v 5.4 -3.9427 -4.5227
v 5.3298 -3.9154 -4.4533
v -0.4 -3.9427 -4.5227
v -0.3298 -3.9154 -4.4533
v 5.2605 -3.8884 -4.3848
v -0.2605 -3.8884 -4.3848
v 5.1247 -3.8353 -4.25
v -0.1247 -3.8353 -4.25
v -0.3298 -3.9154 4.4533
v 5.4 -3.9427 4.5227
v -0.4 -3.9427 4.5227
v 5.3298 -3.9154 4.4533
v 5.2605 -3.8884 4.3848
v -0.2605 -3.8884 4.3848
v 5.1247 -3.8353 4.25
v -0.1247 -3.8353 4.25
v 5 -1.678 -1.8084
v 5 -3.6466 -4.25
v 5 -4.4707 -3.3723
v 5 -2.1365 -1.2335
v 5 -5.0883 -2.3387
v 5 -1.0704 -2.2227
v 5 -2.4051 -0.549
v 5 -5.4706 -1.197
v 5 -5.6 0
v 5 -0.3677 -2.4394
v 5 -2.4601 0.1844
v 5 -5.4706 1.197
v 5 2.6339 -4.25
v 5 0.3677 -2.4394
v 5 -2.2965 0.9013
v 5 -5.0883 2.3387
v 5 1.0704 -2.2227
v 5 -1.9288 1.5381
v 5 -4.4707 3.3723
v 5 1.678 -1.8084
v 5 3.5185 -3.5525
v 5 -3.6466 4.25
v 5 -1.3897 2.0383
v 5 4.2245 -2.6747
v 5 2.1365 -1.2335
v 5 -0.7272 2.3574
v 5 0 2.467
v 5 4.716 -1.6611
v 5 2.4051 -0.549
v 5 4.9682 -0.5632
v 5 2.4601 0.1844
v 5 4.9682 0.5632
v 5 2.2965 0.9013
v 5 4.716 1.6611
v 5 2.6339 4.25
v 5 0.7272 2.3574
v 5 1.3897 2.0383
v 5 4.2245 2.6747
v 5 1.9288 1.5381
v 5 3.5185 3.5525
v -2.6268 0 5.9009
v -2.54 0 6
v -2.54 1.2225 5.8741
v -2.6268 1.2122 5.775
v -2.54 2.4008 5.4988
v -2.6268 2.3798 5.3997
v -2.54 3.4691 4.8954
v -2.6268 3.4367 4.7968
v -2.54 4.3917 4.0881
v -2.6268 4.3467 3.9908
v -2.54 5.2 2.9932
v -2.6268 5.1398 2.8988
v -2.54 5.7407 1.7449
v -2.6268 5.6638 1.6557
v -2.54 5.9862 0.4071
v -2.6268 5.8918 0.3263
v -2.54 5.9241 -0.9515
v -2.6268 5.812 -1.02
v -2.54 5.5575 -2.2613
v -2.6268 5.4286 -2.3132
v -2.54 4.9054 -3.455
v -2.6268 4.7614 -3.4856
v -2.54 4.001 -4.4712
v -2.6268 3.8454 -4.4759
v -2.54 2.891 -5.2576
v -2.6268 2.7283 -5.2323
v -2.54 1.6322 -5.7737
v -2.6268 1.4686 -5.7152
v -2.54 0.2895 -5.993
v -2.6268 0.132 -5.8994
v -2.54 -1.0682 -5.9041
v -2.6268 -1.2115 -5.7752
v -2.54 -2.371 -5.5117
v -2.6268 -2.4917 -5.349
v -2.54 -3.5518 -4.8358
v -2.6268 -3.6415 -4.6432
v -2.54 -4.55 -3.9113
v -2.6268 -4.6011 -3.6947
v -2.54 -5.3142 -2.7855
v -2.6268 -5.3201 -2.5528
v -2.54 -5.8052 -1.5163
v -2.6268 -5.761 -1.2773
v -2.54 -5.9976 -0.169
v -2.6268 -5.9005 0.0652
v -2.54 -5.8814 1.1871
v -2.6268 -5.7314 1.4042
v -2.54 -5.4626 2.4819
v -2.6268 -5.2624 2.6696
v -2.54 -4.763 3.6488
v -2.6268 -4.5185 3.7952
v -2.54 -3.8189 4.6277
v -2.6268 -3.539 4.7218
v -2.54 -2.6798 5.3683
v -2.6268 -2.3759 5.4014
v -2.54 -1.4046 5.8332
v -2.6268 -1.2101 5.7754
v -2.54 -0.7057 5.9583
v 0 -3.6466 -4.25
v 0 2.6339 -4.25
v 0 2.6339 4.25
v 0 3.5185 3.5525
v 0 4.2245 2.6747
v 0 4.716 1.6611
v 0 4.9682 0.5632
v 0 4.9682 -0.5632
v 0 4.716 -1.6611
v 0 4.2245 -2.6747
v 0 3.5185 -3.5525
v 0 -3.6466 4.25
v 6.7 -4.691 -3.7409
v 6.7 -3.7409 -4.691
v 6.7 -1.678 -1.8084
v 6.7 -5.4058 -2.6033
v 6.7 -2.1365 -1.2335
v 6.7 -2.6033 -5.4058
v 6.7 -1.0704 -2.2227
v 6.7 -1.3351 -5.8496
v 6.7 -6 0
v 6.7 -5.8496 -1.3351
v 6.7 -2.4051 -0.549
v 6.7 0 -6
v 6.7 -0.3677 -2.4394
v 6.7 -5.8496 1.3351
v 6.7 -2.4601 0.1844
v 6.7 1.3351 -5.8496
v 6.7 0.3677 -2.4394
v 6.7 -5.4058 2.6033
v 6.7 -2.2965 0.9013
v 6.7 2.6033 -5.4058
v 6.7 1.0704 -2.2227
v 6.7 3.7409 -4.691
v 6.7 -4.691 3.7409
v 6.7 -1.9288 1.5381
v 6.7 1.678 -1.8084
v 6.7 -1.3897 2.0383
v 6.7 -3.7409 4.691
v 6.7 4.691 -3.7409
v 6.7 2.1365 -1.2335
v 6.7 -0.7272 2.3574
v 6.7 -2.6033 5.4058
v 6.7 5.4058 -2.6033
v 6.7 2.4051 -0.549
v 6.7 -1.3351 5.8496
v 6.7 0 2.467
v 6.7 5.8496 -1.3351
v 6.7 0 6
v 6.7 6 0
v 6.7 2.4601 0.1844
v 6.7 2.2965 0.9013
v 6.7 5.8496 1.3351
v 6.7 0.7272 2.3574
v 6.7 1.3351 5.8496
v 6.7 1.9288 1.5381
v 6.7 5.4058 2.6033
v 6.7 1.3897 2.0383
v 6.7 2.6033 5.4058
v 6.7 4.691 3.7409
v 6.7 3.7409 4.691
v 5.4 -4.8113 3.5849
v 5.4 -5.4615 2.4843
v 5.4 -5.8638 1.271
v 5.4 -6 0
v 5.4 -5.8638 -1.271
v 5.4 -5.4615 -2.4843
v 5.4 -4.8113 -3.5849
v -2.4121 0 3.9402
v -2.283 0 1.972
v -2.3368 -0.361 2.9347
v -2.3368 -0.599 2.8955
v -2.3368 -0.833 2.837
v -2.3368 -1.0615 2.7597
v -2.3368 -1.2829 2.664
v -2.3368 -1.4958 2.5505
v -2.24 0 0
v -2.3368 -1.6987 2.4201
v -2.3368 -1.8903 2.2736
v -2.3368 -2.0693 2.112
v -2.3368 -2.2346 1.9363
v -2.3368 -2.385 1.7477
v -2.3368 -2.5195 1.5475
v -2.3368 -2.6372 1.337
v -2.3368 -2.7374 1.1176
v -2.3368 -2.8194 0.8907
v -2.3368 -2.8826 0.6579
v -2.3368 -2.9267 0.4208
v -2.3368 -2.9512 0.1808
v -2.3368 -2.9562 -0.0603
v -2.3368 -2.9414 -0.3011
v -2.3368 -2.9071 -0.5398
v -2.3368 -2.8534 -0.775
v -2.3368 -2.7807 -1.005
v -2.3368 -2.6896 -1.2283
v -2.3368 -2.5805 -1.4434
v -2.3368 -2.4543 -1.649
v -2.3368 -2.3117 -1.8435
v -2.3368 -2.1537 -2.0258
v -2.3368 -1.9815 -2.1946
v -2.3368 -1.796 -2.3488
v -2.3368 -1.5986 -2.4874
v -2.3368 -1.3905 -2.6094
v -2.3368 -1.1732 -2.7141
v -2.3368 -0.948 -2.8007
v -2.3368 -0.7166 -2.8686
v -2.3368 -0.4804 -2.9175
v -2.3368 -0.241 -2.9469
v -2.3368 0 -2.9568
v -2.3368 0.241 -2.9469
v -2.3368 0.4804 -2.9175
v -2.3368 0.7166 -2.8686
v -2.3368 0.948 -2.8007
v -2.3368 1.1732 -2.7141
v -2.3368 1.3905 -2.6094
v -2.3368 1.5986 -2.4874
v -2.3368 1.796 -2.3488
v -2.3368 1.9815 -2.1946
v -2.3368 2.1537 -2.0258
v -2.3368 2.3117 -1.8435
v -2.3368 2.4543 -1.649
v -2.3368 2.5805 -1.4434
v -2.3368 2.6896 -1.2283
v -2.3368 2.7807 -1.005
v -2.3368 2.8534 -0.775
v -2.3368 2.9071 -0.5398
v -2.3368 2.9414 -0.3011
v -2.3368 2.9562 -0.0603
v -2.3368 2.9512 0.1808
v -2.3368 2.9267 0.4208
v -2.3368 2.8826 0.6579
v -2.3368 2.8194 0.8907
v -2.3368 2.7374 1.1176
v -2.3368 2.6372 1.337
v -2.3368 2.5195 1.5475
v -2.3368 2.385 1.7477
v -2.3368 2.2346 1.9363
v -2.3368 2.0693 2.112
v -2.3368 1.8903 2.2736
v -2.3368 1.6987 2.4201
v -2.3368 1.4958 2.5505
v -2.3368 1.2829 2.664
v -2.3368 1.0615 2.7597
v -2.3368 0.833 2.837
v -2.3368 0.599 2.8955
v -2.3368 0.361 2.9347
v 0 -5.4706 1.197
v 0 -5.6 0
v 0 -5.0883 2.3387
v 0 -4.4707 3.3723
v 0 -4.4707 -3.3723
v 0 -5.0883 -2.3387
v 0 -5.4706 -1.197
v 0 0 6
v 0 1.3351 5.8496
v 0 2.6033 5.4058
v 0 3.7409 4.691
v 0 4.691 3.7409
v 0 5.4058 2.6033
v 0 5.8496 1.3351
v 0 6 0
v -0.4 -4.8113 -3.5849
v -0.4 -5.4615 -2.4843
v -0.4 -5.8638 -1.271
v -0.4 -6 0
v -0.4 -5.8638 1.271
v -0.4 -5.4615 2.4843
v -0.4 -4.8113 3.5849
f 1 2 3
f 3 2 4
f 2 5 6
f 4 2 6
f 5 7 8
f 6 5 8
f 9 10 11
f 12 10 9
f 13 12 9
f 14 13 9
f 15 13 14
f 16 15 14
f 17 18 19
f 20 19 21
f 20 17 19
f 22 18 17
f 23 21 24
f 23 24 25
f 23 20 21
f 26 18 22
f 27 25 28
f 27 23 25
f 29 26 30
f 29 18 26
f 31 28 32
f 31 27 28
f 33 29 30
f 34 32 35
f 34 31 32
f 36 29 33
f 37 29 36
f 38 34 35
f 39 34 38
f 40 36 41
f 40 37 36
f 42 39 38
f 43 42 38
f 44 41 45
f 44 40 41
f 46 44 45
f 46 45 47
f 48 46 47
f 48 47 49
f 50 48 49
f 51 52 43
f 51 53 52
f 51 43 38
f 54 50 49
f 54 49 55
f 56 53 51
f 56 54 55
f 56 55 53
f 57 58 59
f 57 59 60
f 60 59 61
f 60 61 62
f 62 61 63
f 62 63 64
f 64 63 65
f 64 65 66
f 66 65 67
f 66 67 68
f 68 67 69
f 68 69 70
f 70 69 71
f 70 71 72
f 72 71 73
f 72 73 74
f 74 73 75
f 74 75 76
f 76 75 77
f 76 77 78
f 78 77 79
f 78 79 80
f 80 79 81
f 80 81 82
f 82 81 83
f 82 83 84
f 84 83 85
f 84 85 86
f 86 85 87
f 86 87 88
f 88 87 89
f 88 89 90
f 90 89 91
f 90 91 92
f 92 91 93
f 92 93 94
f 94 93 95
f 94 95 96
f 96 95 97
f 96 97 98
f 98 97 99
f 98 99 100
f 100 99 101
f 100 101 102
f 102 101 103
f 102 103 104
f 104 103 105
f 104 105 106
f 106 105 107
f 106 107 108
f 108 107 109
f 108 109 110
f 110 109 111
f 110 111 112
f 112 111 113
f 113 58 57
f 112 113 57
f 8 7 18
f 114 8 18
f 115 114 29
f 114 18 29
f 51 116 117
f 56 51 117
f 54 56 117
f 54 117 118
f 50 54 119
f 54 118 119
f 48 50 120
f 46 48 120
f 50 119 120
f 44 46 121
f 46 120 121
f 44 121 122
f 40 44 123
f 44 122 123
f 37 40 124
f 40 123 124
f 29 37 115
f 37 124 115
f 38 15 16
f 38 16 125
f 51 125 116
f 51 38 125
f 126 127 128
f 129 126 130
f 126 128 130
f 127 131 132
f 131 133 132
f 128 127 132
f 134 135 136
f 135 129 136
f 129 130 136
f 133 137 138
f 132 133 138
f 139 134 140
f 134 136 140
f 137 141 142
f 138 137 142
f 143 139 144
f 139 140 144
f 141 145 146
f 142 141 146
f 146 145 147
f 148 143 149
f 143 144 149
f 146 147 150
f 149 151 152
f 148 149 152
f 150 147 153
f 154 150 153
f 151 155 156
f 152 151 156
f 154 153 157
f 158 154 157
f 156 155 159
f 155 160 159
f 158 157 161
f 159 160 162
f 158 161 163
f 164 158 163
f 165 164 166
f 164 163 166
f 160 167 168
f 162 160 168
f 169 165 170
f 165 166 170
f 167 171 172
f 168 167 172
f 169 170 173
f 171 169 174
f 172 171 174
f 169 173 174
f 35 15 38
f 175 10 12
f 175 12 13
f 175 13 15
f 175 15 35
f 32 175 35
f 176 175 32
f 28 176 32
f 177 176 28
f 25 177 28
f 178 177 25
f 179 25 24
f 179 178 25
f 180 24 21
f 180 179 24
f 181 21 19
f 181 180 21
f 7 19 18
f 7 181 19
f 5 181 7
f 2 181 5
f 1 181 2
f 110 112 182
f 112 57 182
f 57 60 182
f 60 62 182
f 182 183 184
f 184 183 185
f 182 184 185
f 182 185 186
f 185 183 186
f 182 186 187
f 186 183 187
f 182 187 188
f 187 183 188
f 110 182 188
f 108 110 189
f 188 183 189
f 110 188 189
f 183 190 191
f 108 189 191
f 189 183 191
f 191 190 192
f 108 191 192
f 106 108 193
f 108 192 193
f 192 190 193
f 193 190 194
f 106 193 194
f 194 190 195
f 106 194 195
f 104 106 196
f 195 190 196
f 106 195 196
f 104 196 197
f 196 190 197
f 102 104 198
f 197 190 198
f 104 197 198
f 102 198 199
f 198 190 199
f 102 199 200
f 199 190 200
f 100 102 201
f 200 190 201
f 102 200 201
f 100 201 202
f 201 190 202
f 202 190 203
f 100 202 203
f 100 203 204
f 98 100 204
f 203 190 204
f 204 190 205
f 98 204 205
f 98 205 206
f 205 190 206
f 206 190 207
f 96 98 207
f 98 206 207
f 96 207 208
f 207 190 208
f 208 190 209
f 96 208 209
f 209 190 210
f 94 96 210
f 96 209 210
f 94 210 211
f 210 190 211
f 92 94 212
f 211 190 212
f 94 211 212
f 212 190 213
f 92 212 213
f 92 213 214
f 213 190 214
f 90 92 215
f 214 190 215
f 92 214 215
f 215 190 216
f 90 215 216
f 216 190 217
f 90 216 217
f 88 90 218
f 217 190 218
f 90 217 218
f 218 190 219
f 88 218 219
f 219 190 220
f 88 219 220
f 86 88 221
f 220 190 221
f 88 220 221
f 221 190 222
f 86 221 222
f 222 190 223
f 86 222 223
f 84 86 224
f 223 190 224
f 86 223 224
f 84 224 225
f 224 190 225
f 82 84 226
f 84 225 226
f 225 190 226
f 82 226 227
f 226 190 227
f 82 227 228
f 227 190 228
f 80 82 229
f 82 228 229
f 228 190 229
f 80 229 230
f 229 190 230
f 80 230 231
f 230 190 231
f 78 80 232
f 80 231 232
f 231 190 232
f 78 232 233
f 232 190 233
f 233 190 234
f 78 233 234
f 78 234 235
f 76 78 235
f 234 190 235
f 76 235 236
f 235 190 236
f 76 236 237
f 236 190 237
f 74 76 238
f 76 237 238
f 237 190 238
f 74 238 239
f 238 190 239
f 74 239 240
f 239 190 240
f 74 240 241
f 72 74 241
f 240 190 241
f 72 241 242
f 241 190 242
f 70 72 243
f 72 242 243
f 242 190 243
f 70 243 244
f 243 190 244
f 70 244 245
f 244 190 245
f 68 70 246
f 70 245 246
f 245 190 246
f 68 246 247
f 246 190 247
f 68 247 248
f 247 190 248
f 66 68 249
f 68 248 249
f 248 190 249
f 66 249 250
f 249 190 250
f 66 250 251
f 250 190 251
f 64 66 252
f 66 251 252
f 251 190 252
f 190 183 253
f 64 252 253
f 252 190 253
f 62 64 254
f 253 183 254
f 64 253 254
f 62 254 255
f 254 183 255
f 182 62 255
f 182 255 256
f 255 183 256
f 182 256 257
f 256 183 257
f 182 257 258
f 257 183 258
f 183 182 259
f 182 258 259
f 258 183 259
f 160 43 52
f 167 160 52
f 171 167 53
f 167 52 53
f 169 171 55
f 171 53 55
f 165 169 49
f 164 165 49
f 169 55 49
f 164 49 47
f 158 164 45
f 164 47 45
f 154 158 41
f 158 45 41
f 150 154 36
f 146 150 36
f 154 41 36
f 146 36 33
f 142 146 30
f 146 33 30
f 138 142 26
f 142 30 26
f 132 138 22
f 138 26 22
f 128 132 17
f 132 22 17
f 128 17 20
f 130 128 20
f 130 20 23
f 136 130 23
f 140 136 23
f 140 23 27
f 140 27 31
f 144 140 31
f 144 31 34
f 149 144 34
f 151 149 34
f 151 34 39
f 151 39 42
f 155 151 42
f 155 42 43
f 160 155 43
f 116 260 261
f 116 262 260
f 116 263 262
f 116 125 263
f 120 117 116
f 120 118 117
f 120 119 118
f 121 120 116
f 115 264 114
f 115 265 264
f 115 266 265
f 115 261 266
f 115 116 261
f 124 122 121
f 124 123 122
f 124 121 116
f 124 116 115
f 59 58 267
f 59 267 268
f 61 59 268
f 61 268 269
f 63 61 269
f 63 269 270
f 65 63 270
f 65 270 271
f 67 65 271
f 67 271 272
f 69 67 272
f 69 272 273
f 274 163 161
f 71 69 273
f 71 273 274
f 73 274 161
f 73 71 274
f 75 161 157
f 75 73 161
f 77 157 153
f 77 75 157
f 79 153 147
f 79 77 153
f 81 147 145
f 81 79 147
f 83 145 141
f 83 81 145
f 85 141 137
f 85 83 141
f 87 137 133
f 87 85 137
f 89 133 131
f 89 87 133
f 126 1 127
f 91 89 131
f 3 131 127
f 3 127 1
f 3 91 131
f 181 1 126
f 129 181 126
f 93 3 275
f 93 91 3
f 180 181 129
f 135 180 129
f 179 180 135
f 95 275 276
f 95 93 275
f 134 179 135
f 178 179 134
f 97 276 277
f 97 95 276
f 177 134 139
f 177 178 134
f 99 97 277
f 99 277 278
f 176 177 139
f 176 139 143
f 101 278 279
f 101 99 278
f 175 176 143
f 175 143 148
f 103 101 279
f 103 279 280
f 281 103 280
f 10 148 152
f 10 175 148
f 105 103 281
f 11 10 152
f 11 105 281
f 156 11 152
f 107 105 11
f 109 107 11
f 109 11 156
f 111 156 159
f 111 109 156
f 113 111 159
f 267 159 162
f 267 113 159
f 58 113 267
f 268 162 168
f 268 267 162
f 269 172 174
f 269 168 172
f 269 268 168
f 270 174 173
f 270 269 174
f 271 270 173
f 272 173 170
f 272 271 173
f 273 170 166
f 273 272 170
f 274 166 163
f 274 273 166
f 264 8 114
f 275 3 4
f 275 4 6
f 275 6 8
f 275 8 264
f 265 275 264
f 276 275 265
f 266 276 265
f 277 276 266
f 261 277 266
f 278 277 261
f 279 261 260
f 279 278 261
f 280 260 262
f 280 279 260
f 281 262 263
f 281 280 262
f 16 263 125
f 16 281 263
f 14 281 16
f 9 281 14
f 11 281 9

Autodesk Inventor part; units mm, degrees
ref_plane "YZ Plane" through (0, 0, 0) normal (1, 0, 0) x (0, 1, 0)
ref_plane "XZ Plane" through (0, 0, 0) normal (0, 1, 0) x (-1, 0, 0)
ref_plane "XY Plane" through (0, 0, 0) normal (0, 0, 1) x (1, 0, 0)
sketch "Эскиз1" plane through (0, 0, 0) normal (1, 0, 0) x (0, 1, 0)
  circle A0 centre (0, 0) radius 2.067 construction
  circle A1 centre (0, 0) radius 5
  circle A2 centre (0, 0) radius 6
  circle A3 centre (0, 0) radius 2.467 projected
  point P0 (0, 0)
  dimension "d1" = 10
  dimension "d2" = 12
extrude "Выдавливание1" add sketch "Эскиз1" along normal blind 6.7 contours A2
sketch "Эскиз4" plane through (0, 0, 0) normal (-1, 0, 0) x (0, 0, 1)
  circle A0 centre (0, 0) radius 6 projected
  circle A1 centre (0, 0) radius 5 projected
  point P0 (0, 0)
extrude "Выдавливание2" add sketch "Эскиз4" along normal blind 2.64 contours A0 | A1
ref_plane "РабПлоскость1" through (0, 0, 0) normal (0, 1, 0) x (-1, 0, 0)
sketch "Эскиз5" plane through (0, 0, 0) normal (0, 1, 0) x (-1, 0, 0)
  line L0 (2.64, -6) -> (-6.7, -6) projected
  line L1 (-5, 6) -> (0, 6)
  line L2 (0, 6) -> (0, -6)
  line L3 (0, -6) -> (-5, -6)
  line L4 (-5, -6) -> (-5, 6)
  line L5 (2.64, 6) -> (-6.7, 6) projected
  line L6 (0, 6) -> (0, -6) projected
  point P0 (0, 0)
  dimension "d7" = 5
extrude "Выдавливание3" cut sketch "Эскиз5" against normal through all
sketch "Эскиз6" plane through (5, 0, 5) normal (-1, 0, 0) x (0, 0, 1)
  circle A0 centre (-5, 0) radius 5 projected
  circle A1 centre (-5, 0) radius 2.467 projected
extrude "Выдавливание4" add sketch "Эскиз6" against normal up to surface (1.7 mm away)
sketch "Эскиз7" plane through (5, 0, 5) normal (-1, 0, 0) x (0, 0, 1)
  line L0 (-1, 0) -> (-1, -2.3094) projected
  line L1 (-9, -2.3094) -> (-9, 0) projected
  circle A0 centre (-5, 0) radius 6 projected
  line L2 (-0.75, -4.2353) -> (-0.75, -2.6339)
  line L3 (1, 0) -> (0, 0) projected
  line L4 (-10, 0) -> (-11, 0) projected
  line L5 (-9.25, -2.6339) -> (-9.25, -4.2353)
  line L6 (-0.75, -2.6339) -> (-0.75, 4.2353)
  line L7 (-9.25, -2.6339) -> (-9.25, 4.2353)
  point P0 (-5, 0)
  point P1 (-9.25, -3.4346)
  dimension "d12" = 0.25
  dimension "d13" = 0.25
extrude "Выдавливание5" add sketch "Эскиз7" along normal up to surface (5 mm away) contours A0 L2 L6 | L7 L5 A0
chamfer "Фаска1" distance 0.4 angle 45 4 edges at (5, -6, 0) (2.5, -4.2353, 4.25) (2.5, -4.2353, -4.25) (0, -6, 0)
ref_plane "РабПлоскость2" through (0, 0, 0) normal (-1, 0, 0) x (0, 0, 1)
ref_plane "РабПлоскость3" through (0, 0, 0) normal (0, 1, 0) x (-1, 0, 0)
sketch "Эскиз9" plane through (0, 0, 0) normal (0, 1, 0) x (-1, 0, 0)
  line L0 (2.64, -6) -> (2.64, 6) projected
  arc A0 (2.64, 6) -> (2.64, -6) centre (47.44, 0) ccw
  line L1 (2.24, 0) -> (2.64, 0)
  point P0 (0, 0)
  dimension "d19" = 0.4
revolve "Вращение1" cut sketch "Эскиз9" angle 360 about axis through (-2.24, 0, 0) along (-1, 0, 0) picked at (2.566, 3.3355) contours L1 A0 L0
chamfer "Фаска2" distance 0.1 angle 45 1 edges at (-2.64, 0, -6)
equation "\"d13\" = d12"
properties part number "kicker"
